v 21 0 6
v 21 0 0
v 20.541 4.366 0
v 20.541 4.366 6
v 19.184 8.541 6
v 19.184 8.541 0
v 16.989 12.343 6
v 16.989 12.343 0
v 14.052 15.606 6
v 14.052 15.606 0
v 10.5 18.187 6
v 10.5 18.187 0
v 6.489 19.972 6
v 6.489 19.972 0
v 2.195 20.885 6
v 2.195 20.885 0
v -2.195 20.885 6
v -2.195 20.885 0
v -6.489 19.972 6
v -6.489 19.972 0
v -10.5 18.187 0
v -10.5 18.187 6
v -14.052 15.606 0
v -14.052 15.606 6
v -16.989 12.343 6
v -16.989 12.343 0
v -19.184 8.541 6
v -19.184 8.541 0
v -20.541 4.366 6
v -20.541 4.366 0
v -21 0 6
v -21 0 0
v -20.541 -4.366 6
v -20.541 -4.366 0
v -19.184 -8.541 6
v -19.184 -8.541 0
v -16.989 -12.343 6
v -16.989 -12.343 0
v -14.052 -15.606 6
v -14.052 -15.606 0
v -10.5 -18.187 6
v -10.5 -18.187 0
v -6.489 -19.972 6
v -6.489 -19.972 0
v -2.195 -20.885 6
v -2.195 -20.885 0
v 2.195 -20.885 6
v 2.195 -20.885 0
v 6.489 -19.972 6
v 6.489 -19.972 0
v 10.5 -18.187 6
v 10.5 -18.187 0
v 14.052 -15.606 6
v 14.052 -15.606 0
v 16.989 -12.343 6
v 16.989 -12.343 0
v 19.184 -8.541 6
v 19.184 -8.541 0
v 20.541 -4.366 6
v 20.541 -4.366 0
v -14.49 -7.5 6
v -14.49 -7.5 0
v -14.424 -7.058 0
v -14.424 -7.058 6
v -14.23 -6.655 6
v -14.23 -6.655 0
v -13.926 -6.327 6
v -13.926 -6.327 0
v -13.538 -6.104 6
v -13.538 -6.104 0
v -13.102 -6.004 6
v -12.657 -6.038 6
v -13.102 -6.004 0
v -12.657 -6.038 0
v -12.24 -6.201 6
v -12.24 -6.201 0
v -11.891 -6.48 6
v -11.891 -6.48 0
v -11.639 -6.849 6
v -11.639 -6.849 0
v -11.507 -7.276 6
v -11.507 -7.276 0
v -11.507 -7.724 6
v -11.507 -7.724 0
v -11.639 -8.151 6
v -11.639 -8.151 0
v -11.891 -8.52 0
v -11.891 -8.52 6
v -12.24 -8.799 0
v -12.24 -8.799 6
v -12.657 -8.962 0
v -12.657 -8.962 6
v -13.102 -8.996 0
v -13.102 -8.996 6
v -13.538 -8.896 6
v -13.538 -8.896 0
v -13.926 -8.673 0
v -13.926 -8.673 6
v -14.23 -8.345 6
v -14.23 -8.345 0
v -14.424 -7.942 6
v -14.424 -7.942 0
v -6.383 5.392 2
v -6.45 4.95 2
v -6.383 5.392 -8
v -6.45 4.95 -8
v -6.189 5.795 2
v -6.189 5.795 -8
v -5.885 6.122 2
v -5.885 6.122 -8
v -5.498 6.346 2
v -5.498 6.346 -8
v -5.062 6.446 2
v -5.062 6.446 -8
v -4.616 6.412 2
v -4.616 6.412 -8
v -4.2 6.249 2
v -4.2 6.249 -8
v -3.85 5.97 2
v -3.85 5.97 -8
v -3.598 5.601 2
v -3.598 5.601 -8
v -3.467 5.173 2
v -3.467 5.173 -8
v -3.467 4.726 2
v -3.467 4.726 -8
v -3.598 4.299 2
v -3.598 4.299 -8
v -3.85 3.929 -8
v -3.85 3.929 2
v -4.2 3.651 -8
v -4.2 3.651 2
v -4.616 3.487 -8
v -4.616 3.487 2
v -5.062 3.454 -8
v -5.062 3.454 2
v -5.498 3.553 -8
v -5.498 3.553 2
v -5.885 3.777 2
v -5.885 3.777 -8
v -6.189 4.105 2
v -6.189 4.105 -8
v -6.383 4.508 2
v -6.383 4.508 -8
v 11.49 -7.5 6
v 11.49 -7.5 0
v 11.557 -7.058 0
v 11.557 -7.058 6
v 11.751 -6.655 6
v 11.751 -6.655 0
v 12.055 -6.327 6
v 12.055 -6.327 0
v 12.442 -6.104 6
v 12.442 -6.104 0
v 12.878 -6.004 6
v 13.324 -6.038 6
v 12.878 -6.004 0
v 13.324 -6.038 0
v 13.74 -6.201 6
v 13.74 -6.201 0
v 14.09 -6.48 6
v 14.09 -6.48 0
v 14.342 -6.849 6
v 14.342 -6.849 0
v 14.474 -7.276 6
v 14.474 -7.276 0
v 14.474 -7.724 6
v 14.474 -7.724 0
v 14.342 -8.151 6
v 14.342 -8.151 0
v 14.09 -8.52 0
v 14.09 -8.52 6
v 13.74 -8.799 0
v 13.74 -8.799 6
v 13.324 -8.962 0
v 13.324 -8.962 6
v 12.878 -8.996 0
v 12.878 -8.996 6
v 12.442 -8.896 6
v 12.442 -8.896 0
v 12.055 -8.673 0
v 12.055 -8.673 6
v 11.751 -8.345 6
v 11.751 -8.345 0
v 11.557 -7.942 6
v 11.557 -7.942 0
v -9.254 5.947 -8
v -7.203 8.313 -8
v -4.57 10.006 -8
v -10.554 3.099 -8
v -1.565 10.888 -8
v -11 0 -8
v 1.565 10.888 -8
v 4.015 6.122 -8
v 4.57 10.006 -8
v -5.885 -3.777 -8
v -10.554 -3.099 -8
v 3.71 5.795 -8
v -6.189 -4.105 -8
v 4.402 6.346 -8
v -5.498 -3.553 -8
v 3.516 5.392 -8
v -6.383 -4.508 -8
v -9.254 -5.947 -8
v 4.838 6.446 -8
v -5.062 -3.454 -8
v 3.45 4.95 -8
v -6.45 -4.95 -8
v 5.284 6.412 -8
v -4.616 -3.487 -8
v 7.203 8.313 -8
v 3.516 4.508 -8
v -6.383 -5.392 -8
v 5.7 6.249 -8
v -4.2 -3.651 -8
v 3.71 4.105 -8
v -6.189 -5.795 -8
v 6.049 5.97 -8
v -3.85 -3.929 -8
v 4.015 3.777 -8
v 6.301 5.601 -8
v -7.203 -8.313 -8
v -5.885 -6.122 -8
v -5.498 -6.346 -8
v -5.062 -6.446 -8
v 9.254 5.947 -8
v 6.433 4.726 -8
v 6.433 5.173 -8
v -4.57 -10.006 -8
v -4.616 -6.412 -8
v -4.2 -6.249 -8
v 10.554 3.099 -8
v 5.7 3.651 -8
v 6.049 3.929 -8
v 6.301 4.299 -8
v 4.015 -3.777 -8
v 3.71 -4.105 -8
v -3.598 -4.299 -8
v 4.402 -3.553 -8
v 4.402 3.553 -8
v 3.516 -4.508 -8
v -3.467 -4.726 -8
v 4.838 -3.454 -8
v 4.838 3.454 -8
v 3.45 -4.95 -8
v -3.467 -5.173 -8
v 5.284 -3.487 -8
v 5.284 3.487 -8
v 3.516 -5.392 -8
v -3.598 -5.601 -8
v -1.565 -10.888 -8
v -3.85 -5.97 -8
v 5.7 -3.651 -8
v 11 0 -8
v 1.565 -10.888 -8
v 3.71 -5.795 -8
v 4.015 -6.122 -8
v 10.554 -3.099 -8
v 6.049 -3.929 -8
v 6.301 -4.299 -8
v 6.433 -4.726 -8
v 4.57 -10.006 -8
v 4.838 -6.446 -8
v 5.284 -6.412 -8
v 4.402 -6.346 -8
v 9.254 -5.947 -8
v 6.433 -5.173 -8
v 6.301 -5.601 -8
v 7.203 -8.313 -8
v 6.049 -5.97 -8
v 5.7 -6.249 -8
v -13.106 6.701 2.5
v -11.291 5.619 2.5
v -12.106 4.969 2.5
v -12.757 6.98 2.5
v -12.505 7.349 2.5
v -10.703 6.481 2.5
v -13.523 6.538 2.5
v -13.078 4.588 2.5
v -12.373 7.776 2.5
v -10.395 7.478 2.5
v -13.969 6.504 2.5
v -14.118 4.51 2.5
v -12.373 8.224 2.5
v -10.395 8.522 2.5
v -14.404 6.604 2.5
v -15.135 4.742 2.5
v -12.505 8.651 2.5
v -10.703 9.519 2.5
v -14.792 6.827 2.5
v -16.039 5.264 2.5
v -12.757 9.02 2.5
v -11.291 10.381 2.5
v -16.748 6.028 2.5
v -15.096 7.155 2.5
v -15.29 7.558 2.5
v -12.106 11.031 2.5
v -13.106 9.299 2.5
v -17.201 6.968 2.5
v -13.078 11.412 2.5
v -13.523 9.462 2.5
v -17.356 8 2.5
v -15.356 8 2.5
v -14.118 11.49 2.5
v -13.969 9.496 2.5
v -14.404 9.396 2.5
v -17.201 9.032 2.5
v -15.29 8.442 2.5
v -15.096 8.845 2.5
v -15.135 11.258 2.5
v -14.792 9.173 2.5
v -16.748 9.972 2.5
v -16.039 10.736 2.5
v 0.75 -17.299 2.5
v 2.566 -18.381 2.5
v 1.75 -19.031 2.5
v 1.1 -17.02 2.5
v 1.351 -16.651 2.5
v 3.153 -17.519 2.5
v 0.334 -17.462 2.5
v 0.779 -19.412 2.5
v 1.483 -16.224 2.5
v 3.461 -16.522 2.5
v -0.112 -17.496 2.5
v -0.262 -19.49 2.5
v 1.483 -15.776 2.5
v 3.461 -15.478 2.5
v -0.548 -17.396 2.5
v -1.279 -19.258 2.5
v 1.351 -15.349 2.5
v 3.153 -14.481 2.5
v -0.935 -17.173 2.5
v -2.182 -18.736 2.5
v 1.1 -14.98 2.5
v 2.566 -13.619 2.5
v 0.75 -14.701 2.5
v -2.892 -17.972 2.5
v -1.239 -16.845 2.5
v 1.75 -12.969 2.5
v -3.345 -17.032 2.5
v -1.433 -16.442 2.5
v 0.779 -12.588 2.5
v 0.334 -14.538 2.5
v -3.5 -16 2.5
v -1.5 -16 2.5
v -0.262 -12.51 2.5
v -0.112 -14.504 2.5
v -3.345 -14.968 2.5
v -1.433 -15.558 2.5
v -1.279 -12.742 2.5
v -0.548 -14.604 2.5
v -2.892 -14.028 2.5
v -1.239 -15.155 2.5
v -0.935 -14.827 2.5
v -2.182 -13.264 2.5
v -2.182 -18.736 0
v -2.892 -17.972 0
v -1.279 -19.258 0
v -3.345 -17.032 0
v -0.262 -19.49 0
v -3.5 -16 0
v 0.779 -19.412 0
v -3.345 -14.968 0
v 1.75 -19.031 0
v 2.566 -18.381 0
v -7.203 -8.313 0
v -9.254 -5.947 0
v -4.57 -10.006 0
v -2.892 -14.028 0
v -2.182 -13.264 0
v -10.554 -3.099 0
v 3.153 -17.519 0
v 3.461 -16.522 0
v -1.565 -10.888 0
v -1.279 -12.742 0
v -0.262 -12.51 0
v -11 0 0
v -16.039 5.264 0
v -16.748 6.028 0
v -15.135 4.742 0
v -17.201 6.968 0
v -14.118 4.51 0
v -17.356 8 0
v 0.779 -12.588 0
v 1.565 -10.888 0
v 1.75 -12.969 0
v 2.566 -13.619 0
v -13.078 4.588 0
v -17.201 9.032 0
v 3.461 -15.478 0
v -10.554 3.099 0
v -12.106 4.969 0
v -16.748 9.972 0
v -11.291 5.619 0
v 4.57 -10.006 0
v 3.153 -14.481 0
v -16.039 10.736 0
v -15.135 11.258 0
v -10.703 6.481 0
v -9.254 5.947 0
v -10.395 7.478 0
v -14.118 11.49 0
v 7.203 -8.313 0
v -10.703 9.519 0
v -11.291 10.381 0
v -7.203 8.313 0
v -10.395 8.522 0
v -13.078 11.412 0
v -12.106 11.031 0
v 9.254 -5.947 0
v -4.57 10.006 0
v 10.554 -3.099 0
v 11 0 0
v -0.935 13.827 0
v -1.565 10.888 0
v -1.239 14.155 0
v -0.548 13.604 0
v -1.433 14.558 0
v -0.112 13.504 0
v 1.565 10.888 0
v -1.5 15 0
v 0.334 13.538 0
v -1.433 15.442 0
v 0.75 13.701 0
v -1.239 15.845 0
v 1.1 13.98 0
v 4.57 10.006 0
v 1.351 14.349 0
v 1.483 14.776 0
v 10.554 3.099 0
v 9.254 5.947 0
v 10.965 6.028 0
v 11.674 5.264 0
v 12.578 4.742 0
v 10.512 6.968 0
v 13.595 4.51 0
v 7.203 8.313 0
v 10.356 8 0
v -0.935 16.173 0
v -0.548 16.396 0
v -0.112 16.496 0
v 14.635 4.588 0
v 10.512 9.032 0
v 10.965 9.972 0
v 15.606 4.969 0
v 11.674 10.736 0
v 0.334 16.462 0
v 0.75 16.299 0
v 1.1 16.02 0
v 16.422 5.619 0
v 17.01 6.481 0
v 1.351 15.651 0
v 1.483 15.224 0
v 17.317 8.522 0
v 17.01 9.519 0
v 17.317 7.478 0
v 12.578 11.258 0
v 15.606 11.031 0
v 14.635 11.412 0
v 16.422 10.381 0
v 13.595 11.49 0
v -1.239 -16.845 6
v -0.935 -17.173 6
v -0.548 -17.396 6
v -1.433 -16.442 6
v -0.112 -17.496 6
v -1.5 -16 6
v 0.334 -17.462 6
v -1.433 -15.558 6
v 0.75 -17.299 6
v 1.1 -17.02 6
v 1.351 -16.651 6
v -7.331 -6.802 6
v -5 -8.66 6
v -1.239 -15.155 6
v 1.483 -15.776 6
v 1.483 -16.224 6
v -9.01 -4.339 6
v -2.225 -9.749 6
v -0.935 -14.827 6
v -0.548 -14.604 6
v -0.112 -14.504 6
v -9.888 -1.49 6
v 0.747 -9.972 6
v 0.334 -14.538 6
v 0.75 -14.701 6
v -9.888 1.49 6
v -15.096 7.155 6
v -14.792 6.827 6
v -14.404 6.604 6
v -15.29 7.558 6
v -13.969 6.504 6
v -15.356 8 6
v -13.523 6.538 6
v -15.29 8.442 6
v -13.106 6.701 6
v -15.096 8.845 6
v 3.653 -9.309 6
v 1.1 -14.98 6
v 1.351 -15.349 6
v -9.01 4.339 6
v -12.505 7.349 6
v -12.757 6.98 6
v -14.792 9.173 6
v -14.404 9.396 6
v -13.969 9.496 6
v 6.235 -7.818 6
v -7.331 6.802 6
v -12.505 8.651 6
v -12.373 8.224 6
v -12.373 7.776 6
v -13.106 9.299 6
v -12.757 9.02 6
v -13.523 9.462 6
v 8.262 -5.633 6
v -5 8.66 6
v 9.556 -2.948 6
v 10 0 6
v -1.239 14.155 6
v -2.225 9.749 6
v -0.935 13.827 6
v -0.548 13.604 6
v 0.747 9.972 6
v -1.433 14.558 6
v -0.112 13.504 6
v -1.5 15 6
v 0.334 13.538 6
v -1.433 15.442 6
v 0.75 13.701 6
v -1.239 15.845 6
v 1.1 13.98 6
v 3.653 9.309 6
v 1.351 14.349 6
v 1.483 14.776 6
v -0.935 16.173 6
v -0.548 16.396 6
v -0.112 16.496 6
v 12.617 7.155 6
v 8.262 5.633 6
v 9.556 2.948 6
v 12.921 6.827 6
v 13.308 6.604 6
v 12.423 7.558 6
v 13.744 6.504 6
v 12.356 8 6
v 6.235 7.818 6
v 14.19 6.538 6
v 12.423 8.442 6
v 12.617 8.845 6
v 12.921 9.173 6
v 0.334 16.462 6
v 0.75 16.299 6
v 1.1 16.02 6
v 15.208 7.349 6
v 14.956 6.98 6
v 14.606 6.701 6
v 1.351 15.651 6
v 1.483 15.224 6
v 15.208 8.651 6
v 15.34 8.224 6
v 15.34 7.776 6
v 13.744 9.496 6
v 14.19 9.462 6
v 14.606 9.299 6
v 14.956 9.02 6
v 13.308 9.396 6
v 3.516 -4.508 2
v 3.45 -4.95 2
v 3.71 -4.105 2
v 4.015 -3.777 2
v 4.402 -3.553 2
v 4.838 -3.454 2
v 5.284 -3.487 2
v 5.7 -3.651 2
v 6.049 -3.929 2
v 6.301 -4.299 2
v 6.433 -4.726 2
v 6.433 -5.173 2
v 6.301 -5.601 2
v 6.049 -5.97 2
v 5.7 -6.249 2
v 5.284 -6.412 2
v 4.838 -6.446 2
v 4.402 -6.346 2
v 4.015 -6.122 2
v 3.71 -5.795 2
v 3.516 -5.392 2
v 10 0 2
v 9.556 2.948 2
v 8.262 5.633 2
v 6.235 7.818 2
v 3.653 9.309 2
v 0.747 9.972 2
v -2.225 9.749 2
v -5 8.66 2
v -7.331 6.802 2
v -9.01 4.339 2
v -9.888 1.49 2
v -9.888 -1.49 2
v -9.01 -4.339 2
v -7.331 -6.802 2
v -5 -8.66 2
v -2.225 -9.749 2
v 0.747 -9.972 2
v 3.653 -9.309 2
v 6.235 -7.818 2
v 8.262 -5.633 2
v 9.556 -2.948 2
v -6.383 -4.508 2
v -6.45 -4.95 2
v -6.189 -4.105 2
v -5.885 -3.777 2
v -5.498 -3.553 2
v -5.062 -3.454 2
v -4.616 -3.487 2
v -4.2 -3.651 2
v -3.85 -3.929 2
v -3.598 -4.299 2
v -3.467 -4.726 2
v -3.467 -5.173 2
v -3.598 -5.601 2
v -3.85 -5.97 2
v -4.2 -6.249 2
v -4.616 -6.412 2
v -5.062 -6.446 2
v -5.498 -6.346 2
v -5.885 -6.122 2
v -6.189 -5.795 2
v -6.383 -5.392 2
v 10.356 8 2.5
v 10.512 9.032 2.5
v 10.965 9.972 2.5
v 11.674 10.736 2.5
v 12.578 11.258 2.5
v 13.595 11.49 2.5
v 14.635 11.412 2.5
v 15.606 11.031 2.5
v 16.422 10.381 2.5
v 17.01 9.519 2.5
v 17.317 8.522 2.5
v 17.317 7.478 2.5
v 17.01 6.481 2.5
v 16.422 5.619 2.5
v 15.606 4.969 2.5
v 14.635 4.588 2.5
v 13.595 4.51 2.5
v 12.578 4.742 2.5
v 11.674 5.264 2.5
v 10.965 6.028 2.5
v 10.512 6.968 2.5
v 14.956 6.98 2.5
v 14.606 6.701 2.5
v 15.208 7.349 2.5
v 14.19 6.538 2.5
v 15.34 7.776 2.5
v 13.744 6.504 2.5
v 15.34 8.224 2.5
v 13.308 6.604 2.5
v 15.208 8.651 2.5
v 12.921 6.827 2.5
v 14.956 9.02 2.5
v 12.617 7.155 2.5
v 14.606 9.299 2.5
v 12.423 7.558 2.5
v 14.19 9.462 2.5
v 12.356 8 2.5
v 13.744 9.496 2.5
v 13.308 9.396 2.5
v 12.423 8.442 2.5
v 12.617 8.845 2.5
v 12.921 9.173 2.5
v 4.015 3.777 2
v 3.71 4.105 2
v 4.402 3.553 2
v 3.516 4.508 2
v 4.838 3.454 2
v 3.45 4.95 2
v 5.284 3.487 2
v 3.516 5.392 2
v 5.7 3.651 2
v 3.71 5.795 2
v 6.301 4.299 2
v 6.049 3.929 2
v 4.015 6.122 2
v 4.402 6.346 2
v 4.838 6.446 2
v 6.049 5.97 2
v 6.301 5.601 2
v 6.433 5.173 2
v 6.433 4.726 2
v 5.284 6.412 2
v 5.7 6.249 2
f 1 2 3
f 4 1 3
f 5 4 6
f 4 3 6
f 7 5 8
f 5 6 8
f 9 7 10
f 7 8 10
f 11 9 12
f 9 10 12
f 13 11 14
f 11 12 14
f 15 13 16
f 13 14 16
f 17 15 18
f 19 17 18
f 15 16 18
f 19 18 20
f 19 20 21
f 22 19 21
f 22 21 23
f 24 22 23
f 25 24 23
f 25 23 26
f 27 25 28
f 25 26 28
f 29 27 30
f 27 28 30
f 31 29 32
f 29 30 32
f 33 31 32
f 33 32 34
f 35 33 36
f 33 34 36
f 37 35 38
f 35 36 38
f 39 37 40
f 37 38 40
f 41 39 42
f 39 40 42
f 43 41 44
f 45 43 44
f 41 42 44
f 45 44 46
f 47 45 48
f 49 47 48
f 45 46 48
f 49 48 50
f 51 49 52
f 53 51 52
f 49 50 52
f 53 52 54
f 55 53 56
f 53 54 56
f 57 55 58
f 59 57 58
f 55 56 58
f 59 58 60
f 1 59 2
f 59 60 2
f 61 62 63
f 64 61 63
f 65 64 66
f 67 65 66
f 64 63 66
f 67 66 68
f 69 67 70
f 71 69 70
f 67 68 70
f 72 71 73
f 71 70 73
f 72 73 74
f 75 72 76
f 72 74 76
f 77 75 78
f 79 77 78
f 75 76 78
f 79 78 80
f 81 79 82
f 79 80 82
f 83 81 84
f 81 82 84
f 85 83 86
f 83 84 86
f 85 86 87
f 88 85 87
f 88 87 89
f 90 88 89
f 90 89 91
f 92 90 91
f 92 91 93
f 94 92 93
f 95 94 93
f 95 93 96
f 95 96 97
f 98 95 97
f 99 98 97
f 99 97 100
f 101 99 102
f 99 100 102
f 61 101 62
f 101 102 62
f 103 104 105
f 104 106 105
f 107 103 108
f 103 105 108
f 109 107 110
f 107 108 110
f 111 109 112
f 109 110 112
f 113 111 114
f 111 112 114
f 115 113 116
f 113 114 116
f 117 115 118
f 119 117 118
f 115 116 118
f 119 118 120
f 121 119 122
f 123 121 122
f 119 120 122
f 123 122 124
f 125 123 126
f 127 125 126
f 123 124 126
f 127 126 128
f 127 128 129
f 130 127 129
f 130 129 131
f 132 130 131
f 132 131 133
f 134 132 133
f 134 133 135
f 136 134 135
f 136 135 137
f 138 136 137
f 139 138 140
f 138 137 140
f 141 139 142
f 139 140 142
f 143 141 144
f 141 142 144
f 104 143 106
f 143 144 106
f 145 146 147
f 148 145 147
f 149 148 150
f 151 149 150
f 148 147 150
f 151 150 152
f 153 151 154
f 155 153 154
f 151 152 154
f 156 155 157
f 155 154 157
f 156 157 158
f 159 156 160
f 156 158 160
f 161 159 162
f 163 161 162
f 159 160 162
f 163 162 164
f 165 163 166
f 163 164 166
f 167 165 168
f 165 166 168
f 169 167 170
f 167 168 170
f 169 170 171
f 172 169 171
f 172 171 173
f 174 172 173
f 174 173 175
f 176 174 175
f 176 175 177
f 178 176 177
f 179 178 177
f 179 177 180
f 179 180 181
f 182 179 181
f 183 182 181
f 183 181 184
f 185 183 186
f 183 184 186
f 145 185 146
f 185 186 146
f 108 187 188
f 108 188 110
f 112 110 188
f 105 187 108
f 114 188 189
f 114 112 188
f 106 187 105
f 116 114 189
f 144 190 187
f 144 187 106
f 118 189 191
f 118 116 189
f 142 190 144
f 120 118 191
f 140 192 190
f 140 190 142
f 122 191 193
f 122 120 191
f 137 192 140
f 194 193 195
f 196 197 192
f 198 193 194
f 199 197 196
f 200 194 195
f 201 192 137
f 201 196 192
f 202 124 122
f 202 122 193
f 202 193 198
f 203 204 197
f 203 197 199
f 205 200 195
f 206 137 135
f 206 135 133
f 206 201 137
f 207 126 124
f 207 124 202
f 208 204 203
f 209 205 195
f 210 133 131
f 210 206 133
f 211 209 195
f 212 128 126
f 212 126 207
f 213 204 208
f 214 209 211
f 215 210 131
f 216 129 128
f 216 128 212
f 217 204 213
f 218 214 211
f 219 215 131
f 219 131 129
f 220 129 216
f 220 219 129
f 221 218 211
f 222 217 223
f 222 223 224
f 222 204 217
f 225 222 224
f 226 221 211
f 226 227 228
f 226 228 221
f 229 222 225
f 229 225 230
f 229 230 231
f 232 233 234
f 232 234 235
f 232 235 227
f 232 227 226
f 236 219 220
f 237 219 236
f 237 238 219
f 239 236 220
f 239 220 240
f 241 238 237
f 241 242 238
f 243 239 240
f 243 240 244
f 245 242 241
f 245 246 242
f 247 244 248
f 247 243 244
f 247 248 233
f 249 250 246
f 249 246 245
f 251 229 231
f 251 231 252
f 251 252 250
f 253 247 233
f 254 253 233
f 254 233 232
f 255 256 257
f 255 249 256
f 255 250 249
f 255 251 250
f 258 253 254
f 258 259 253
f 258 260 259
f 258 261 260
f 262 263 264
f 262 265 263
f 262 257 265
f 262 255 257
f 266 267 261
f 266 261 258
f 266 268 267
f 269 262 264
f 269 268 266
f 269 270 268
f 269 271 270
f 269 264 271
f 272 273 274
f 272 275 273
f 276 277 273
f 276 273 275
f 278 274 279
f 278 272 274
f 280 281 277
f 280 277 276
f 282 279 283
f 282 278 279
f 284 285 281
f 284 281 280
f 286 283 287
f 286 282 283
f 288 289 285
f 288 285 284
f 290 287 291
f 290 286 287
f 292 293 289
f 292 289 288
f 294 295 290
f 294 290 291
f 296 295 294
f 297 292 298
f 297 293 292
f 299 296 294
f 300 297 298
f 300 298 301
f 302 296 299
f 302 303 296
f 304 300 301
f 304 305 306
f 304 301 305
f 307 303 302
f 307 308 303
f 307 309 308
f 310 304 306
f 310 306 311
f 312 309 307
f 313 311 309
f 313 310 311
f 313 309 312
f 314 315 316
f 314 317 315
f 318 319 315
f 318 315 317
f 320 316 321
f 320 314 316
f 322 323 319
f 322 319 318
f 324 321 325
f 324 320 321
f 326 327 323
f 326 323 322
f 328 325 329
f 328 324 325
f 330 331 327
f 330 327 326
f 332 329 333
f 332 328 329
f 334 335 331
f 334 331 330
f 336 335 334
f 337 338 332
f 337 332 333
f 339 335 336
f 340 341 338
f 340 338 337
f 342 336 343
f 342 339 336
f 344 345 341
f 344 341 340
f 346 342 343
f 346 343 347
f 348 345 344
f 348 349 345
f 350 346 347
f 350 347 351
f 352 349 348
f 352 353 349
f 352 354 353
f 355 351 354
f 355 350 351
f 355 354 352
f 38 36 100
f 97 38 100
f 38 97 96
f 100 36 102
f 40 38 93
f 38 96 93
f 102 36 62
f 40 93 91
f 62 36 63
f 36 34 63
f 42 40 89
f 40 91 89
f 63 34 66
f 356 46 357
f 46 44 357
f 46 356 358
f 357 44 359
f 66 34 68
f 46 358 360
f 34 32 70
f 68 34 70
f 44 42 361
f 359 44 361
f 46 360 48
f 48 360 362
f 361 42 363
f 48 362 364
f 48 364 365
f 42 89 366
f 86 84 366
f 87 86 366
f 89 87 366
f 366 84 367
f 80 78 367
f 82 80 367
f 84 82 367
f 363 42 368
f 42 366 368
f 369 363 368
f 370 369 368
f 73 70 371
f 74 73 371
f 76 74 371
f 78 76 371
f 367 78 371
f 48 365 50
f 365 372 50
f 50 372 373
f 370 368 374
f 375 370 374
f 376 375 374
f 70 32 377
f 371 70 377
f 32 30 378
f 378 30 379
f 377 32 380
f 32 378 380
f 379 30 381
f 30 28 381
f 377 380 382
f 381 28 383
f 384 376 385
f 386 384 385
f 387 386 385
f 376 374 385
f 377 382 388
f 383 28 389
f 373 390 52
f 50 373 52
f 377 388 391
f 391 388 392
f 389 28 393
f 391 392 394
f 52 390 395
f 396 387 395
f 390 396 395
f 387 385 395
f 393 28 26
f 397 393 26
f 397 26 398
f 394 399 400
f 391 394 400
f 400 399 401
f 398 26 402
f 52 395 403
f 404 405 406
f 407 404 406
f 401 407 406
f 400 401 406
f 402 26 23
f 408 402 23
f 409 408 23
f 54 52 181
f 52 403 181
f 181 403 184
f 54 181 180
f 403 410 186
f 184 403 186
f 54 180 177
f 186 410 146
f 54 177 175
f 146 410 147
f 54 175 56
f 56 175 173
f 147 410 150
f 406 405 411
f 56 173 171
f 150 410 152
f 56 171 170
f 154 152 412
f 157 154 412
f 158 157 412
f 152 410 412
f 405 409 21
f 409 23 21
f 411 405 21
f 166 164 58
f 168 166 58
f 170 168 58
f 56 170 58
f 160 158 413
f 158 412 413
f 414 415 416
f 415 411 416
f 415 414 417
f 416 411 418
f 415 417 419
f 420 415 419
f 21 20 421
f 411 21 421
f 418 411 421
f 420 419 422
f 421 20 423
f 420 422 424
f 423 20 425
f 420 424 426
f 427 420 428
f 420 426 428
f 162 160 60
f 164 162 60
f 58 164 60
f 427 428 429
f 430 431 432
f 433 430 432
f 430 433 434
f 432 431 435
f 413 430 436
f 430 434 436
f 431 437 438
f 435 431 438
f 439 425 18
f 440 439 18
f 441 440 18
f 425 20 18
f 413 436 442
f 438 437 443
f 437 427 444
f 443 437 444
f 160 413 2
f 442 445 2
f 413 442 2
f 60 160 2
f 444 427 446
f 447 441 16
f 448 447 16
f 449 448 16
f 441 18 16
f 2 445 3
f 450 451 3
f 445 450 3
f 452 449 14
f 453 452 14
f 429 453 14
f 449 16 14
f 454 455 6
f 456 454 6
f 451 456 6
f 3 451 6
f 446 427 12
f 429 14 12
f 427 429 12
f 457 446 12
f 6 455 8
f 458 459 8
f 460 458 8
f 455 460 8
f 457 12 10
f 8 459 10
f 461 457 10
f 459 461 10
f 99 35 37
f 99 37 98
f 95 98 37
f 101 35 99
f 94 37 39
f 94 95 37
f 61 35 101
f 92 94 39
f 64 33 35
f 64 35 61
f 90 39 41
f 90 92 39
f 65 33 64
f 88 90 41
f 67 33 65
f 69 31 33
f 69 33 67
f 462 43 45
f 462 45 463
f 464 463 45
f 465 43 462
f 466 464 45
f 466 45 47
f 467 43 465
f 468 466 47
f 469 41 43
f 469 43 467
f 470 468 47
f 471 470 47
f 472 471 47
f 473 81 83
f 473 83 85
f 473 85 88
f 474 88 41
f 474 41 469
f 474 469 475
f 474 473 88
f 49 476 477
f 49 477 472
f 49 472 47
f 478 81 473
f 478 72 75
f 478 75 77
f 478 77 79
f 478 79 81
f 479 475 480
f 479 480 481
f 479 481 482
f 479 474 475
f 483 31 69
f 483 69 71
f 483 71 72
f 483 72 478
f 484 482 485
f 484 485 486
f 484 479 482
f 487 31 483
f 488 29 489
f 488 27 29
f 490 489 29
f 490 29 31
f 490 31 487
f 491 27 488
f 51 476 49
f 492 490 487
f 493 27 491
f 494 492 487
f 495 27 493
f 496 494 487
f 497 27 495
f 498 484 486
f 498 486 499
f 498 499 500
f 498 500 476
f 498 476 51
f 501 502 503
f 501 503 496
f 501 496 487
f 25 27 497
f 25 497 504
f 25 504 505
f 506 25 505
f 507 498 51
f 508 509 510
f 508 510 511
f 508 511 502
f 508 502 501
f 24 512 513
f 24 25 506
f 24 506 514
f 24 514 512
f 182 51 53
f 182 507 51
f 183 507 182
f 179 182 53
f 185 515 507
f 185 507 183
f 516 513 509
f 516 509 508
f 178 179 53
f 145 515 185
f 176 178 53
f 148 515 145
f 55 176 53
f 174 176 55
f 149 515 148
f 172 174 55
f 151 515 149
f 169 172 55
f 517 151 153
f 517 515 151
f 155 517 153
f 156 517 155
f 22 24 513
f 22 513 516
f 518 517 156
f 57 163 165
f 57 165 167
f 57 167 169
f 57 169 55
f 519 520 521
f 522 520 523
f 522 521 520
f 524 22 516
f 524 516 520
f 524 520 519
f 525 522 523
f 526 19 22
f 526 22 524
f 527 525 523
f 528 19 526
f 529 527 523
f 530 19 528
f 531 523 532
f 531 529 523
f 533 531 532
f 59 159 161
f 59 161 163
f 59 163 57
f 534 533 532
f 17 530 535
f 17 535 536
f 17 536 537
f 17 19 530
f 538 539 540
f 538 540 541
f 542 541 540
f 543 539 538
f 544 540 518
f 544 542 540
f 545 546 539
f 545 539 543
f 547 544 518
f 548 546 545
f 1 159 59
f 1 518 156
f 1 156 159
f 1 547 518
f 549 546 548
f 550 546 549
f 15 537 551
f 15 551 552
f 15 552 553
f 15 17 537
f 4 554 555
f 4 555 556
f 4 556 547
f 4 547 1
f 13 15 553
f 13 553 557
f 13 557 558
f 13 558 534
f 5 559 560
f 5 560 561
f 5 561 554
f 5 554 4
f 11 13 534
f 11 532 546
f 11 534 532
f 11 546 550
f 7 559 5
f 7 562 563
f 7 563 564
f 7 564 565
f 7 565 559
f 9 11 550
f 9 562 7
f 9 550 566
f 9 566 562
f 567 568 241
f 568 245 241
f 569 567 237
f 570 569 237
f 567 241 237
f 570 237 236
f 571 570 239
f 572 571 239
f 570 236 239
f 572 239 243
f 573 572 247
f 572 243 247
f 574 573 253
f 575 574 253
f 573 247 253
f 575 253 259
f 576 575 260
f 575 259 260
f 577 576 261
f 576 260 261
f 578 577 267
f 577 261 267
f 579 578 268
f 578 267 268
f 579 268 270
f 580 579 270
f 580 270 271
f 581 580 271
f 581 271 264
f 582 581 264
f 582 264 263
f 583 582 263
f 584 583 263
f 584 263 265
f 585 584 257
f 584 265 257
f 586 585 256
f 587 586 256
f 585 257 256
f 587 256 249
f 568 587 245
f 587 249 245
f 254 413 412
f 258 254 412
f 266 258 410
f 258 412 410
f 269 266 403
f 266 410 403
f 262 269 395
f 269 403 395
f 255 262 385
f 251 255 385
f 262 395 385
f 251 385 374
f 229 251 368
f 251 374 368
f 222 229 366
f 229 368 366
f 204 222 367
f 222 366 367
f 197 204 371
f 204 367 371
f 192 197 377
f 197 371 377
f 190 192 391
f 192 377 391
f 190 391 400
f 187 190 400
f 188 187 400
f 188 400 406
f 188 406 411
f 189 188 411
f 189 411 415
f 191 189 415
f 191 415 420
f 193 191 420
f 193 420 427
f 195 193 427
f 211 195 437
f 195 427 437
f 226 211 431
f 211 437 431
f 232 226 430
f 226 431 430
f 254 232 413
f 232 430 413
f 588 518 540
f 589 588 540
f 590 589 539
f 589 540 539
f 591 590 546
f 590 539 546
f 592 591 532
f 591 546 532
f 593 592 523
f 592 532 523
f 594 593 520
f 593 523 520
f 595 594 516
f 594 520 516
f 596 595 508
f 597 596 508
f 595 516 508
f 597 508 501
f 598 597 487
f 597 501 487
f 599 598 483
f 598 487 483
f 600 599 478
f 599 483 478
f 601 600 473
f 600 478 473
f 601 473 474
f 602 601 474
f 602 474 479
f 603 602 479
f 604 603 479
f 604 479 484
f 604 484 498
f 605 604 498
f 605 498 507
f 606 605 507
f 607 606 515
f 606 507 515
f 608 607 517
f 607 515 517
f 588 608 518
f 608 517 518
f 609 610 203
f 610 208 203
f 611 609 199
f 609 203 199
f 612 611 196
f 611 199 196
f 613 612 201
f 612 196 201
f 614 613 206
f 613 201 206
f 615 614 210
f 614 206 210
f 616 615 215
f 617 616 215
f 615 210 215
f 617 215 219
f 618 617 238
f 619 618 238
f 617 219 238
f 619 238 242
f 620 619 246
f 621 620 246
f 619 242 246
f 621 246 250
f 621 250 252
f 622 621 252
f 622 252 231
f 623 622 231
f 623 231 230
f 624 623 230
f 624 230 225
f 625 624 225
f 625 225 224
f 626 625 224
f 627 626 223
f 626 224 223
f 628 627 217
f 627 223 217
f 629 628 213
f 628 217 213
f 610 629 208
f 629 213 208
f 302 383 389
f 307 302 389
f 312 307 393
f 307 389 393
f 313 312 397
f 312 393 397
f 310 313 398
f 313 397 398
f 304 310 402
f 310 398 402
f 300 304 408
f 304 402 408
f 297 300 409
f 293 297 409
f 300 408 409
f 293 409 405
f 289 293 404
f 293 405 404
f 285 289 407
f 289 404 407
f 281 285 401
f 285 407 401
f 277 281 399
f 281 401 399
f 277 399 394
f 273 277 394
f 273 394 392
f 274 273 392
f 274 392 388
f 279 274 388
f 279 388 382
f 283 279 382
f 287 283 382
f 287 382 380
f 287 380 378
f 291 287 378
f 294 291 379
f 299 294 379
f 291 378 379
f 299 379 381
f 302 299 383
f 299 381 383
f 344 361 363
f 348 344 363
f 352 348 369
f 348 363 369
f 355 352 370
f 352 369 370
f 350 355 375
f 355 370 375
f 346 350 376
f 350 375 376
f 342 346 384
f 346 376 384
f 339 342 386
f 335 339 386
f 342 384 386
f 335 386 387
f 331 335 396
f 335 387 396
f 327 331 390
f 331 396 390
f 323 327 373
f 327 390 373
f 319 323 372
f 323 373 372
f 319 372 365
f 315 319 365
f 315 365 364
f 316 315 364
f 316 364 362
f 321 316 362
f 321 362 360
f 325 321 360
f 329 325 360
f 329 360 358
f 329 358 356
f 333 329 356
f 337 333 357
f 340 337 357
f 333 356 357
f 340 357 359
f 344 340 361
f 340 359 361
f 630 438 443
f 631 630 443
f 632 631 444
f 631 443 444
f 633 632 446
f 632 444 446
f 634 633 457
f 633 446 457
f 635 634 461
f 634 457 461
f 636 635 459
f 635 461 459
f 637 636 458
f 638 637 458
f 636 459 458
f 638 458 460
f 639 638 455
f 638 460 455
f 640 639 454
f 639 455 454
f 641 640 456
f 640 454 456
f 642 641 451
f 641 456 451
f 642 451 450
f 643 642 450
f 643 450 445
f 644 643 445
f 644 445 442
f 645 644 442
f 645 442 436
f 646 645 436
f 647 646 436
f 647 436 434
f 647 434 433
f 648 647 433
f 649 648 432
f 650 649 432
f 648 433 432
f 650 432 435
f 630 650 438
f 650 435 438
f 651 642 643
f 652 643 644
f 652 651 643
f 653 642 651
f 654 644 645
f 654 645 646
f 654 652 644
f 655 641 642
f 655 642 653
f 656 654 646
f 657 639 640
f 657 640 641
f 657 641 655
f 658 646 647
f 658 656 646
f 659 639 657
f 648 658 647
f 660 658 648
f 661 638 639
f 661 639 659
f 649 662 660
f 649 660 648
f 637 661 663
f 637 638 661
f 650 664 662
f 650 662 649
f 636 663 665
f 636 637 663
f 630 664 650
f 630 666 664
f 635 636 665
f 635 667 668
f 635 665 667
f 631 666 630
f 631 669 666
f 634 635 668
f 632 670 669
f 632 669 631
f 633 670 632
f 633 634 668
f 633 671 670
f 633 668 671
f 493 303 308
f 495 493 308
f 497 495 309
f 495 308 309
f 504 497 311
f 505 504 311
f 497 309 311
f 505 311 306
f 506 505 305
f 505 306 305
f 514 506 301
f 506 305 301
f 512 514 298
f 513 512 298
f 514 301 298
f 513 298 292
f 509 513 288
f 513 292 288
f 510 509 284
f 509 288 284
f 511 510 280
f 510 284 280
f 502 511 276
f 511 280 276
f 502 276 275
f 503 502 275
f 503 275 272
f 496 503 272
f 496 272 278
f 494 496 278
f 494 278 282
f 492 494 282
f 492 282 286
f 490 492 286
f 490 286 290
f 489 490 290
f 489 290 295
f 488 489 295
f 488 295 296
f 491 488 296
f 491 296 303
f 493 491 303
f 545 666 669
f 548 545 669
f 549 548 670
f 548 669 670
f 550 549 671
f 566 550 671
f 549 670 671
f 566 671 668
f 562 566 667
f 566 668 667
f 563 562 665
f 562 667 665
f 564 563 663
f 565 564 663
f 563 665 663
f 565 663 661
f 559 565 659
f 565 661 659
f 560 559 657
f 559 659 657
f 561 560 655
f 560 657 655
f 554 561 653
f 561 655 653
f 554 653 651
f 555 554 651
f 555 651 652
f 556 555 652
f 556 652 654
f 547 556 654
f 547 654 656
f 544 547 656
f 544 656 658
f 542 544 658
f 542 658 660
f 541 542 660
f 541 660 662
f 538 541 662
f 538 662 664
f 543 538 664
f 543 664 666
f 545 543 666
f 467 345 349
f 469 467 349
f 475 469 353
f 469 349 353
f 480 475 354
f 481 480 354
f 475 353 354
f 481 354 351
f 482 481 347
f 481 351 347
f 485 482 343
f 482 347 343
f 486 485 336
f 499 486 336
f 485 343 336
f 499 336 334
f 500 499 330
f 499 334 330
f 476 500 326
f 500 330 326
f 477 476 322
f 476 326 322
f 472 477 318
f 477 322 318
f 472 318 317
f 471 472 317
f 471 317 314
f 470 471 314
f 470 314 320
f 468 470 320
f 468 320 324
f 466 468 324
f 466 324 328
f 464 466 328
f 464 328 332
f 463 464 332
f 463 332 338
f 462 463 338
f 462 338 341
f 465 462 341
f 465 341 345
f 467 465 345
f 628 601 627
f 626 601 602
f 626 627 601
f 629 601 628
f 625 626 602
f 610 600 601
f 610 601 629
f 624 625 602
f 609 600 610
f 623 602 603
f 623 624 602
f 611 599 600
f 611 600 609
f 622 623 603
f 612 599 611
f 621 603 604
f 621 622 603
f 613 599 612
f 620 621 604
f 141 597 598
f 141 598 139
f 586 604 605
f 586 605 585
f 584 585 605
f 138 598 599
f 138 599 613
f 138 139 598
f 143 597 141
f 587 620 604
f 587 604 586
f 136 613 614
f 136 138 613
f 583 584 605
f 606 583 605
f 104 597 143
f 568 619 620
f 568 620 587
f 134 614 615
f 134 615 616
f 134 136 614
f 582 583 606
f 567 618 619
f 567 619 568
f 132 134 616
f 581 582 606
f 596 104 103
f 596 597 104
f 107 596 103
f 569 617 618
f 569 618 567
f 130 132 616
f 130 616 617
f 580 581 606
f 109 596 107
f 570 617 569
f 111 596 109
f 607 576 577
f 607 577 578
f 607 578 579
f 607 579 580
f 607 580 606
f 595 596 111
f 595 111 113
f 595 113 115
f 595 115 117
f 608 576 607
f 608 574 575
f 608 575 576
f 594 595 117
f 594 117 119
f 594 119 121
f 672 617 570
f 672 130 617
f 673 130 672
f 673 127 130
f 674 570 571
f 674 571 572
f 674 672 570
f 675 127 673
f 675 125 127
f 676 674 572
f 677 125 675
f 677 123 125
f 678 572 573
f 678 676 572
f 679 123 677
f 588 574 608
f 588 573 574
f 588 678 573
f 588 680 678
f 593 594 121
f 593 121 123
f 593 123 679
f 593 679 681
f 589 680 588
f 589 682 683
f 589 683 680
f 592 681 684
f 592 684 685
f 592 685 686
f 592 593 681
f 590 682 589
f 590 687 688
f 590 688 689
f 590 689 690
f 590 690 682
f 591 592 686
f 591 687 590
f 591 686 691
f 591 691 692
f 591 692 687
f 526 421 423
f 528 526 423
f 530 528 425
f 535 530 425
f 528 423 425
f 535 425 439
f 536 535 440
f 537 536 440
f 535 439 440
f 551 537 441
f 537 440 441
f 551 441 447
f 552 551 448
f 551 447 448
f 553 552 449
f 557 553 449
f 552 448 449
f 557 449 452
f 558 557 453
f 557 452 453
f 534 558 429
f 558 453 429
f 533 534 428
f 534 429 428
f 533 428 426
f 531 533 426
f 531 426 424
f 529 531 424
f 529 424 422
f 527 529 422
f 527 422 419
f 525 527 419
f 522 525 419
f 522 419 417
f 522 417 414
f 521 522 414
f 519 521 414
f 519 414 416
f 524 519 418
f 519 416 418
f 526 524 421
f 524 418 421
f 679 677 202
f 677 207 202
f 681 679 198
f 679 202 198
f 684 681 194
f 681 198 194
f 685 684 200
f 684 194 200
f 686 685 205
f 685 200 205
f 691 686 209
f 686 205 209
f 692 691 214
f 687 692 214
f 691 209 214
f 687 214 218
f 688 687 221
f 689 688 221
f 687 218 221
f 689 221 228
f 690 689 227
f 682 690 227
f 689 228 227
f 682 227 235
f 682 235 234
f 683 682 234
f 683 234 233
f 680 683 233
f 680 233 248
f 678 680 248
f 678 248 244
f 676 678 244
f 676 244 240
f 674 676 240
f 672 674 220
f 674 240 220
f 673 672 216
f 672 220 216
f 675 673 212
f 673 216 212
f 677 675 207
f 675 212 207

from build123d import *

# Parameters (mm, degrees)
SKETCH1_R           = 21
BOSS_EXTRUDE1_DEPTH = 6
SKETCH6_R           = 1.5
CUT_EXTRUDE2_DEPTH  = 6
SKETCH10_R          = 11
BOSS_EXTRUDE3_DEPTH = 8
SKETCH8_R           = 1.5
CUT_EXTRUDE3_DEPTH  = 10
SKETCH12_R          = 10
CUT_EXTRUDE5_DEPTH  = 4
SKETCH13_R          = 3.5
CUT_EXTRUDE6_DEPTH  = 2.5


with BuildPart() as part:
    # Sketch1 → Boss-Extrude1 (new body)
    with BuildSketch(Plane.XY):
        Circle(SKETCH1_R)
    extrude(amount=BOSS_EXTRUDE1_DEPTH)

    # Sketch6 → Cut-Extrude2 (cut)
    with BuildSketch(Plane(origin=(0, 0, 0), x_dir=(-1, 0, 0), z_dir=(0, 0, -1))):
        with Locations((0, 15)):
            Circle(SKETCH6_R)
        with Locations((12.990381057, -7.5)):
            Circle(SKETCH6_R)
        with Locations((-12.990381057, -7.5)):
            Circle(SKETCH6_R)
        with Locations((13.856406461, 8)):
            Circle(SKETCH6_R)
        with Locations((0, -16)):
            Circle(SKETCH6_R)
        with Locations((-13.856406461, 8)):
            Circle(SKETCH6_R)
    extrude(amount=-CUT_EXTRUDE2_DEPTH, mode=Mode.SUBTRACT)

    # Sketch10 → Boss-Extrude3 (add)
    with BuildSketch(Plane(origin=(0, 0, 0), x_dir=(-1, 0, 0), z_dir=(0, 0, -1))):
        with Locations(Location((0, 0, 0), (0, 0, 180))):
            Circle(SKETCH10_R)
    extrude(amount=BOSS_EXTRUDE3_DEPTH)

    # Sketch8 → Cut-Extrude3 (cut, symmetric)
    with BuildSketch(Plane(origin=(0, 0, 0), x_dir=(-1, 0, 0), z_dir=(0, 0, -1))):
        with Locations((-4.949747468, 4.949747468)):
            Circle(SKETCH8_R)
        with Locations((4.949747468, 4.949747468)):
            Circle(SKETCH8_R)
        with Locations((4.949747468, -4.949747468)):
            Circle(SKETCH8_R)
        with Locations((-4.949747468, -4.949747468)):
            Circle(SKETCH8_R)
    extrude(amount=CUT_EXTRUDE3_DEPTH, both=True, mode=Mode.SUBTRACT)

    # Sketch12 → Cut-Extrude5 (cut)
    with BuildSketch(Plane.XY.offset(6)):
        Circle(SKETCH12_R)
    extrude(amount=-CUT_EXTRUDE5_DEPTH, mode=Mode.SUBTRACT)

    # Sketch13 → Cut-Extrude6 (cut)
    with BuildSketch(Plane(origin=(0, 0, 0), x_dir=(-1, 0, 0), z_dir=(0, 0, -1))):
        with Locations((-13.856406461, 8)):
            Circle(SKETCH13_R)
        with Locations((13.856406461, 8)):
            Circle(SKETCH13_R)
        with Locations((0, -16)):
            Circle(SKETCH13_R)
    extrude(amount=-CUT_EXTRUDE6_DEPTH, mode=Mode.SUBTRACT)


solid = part.part
